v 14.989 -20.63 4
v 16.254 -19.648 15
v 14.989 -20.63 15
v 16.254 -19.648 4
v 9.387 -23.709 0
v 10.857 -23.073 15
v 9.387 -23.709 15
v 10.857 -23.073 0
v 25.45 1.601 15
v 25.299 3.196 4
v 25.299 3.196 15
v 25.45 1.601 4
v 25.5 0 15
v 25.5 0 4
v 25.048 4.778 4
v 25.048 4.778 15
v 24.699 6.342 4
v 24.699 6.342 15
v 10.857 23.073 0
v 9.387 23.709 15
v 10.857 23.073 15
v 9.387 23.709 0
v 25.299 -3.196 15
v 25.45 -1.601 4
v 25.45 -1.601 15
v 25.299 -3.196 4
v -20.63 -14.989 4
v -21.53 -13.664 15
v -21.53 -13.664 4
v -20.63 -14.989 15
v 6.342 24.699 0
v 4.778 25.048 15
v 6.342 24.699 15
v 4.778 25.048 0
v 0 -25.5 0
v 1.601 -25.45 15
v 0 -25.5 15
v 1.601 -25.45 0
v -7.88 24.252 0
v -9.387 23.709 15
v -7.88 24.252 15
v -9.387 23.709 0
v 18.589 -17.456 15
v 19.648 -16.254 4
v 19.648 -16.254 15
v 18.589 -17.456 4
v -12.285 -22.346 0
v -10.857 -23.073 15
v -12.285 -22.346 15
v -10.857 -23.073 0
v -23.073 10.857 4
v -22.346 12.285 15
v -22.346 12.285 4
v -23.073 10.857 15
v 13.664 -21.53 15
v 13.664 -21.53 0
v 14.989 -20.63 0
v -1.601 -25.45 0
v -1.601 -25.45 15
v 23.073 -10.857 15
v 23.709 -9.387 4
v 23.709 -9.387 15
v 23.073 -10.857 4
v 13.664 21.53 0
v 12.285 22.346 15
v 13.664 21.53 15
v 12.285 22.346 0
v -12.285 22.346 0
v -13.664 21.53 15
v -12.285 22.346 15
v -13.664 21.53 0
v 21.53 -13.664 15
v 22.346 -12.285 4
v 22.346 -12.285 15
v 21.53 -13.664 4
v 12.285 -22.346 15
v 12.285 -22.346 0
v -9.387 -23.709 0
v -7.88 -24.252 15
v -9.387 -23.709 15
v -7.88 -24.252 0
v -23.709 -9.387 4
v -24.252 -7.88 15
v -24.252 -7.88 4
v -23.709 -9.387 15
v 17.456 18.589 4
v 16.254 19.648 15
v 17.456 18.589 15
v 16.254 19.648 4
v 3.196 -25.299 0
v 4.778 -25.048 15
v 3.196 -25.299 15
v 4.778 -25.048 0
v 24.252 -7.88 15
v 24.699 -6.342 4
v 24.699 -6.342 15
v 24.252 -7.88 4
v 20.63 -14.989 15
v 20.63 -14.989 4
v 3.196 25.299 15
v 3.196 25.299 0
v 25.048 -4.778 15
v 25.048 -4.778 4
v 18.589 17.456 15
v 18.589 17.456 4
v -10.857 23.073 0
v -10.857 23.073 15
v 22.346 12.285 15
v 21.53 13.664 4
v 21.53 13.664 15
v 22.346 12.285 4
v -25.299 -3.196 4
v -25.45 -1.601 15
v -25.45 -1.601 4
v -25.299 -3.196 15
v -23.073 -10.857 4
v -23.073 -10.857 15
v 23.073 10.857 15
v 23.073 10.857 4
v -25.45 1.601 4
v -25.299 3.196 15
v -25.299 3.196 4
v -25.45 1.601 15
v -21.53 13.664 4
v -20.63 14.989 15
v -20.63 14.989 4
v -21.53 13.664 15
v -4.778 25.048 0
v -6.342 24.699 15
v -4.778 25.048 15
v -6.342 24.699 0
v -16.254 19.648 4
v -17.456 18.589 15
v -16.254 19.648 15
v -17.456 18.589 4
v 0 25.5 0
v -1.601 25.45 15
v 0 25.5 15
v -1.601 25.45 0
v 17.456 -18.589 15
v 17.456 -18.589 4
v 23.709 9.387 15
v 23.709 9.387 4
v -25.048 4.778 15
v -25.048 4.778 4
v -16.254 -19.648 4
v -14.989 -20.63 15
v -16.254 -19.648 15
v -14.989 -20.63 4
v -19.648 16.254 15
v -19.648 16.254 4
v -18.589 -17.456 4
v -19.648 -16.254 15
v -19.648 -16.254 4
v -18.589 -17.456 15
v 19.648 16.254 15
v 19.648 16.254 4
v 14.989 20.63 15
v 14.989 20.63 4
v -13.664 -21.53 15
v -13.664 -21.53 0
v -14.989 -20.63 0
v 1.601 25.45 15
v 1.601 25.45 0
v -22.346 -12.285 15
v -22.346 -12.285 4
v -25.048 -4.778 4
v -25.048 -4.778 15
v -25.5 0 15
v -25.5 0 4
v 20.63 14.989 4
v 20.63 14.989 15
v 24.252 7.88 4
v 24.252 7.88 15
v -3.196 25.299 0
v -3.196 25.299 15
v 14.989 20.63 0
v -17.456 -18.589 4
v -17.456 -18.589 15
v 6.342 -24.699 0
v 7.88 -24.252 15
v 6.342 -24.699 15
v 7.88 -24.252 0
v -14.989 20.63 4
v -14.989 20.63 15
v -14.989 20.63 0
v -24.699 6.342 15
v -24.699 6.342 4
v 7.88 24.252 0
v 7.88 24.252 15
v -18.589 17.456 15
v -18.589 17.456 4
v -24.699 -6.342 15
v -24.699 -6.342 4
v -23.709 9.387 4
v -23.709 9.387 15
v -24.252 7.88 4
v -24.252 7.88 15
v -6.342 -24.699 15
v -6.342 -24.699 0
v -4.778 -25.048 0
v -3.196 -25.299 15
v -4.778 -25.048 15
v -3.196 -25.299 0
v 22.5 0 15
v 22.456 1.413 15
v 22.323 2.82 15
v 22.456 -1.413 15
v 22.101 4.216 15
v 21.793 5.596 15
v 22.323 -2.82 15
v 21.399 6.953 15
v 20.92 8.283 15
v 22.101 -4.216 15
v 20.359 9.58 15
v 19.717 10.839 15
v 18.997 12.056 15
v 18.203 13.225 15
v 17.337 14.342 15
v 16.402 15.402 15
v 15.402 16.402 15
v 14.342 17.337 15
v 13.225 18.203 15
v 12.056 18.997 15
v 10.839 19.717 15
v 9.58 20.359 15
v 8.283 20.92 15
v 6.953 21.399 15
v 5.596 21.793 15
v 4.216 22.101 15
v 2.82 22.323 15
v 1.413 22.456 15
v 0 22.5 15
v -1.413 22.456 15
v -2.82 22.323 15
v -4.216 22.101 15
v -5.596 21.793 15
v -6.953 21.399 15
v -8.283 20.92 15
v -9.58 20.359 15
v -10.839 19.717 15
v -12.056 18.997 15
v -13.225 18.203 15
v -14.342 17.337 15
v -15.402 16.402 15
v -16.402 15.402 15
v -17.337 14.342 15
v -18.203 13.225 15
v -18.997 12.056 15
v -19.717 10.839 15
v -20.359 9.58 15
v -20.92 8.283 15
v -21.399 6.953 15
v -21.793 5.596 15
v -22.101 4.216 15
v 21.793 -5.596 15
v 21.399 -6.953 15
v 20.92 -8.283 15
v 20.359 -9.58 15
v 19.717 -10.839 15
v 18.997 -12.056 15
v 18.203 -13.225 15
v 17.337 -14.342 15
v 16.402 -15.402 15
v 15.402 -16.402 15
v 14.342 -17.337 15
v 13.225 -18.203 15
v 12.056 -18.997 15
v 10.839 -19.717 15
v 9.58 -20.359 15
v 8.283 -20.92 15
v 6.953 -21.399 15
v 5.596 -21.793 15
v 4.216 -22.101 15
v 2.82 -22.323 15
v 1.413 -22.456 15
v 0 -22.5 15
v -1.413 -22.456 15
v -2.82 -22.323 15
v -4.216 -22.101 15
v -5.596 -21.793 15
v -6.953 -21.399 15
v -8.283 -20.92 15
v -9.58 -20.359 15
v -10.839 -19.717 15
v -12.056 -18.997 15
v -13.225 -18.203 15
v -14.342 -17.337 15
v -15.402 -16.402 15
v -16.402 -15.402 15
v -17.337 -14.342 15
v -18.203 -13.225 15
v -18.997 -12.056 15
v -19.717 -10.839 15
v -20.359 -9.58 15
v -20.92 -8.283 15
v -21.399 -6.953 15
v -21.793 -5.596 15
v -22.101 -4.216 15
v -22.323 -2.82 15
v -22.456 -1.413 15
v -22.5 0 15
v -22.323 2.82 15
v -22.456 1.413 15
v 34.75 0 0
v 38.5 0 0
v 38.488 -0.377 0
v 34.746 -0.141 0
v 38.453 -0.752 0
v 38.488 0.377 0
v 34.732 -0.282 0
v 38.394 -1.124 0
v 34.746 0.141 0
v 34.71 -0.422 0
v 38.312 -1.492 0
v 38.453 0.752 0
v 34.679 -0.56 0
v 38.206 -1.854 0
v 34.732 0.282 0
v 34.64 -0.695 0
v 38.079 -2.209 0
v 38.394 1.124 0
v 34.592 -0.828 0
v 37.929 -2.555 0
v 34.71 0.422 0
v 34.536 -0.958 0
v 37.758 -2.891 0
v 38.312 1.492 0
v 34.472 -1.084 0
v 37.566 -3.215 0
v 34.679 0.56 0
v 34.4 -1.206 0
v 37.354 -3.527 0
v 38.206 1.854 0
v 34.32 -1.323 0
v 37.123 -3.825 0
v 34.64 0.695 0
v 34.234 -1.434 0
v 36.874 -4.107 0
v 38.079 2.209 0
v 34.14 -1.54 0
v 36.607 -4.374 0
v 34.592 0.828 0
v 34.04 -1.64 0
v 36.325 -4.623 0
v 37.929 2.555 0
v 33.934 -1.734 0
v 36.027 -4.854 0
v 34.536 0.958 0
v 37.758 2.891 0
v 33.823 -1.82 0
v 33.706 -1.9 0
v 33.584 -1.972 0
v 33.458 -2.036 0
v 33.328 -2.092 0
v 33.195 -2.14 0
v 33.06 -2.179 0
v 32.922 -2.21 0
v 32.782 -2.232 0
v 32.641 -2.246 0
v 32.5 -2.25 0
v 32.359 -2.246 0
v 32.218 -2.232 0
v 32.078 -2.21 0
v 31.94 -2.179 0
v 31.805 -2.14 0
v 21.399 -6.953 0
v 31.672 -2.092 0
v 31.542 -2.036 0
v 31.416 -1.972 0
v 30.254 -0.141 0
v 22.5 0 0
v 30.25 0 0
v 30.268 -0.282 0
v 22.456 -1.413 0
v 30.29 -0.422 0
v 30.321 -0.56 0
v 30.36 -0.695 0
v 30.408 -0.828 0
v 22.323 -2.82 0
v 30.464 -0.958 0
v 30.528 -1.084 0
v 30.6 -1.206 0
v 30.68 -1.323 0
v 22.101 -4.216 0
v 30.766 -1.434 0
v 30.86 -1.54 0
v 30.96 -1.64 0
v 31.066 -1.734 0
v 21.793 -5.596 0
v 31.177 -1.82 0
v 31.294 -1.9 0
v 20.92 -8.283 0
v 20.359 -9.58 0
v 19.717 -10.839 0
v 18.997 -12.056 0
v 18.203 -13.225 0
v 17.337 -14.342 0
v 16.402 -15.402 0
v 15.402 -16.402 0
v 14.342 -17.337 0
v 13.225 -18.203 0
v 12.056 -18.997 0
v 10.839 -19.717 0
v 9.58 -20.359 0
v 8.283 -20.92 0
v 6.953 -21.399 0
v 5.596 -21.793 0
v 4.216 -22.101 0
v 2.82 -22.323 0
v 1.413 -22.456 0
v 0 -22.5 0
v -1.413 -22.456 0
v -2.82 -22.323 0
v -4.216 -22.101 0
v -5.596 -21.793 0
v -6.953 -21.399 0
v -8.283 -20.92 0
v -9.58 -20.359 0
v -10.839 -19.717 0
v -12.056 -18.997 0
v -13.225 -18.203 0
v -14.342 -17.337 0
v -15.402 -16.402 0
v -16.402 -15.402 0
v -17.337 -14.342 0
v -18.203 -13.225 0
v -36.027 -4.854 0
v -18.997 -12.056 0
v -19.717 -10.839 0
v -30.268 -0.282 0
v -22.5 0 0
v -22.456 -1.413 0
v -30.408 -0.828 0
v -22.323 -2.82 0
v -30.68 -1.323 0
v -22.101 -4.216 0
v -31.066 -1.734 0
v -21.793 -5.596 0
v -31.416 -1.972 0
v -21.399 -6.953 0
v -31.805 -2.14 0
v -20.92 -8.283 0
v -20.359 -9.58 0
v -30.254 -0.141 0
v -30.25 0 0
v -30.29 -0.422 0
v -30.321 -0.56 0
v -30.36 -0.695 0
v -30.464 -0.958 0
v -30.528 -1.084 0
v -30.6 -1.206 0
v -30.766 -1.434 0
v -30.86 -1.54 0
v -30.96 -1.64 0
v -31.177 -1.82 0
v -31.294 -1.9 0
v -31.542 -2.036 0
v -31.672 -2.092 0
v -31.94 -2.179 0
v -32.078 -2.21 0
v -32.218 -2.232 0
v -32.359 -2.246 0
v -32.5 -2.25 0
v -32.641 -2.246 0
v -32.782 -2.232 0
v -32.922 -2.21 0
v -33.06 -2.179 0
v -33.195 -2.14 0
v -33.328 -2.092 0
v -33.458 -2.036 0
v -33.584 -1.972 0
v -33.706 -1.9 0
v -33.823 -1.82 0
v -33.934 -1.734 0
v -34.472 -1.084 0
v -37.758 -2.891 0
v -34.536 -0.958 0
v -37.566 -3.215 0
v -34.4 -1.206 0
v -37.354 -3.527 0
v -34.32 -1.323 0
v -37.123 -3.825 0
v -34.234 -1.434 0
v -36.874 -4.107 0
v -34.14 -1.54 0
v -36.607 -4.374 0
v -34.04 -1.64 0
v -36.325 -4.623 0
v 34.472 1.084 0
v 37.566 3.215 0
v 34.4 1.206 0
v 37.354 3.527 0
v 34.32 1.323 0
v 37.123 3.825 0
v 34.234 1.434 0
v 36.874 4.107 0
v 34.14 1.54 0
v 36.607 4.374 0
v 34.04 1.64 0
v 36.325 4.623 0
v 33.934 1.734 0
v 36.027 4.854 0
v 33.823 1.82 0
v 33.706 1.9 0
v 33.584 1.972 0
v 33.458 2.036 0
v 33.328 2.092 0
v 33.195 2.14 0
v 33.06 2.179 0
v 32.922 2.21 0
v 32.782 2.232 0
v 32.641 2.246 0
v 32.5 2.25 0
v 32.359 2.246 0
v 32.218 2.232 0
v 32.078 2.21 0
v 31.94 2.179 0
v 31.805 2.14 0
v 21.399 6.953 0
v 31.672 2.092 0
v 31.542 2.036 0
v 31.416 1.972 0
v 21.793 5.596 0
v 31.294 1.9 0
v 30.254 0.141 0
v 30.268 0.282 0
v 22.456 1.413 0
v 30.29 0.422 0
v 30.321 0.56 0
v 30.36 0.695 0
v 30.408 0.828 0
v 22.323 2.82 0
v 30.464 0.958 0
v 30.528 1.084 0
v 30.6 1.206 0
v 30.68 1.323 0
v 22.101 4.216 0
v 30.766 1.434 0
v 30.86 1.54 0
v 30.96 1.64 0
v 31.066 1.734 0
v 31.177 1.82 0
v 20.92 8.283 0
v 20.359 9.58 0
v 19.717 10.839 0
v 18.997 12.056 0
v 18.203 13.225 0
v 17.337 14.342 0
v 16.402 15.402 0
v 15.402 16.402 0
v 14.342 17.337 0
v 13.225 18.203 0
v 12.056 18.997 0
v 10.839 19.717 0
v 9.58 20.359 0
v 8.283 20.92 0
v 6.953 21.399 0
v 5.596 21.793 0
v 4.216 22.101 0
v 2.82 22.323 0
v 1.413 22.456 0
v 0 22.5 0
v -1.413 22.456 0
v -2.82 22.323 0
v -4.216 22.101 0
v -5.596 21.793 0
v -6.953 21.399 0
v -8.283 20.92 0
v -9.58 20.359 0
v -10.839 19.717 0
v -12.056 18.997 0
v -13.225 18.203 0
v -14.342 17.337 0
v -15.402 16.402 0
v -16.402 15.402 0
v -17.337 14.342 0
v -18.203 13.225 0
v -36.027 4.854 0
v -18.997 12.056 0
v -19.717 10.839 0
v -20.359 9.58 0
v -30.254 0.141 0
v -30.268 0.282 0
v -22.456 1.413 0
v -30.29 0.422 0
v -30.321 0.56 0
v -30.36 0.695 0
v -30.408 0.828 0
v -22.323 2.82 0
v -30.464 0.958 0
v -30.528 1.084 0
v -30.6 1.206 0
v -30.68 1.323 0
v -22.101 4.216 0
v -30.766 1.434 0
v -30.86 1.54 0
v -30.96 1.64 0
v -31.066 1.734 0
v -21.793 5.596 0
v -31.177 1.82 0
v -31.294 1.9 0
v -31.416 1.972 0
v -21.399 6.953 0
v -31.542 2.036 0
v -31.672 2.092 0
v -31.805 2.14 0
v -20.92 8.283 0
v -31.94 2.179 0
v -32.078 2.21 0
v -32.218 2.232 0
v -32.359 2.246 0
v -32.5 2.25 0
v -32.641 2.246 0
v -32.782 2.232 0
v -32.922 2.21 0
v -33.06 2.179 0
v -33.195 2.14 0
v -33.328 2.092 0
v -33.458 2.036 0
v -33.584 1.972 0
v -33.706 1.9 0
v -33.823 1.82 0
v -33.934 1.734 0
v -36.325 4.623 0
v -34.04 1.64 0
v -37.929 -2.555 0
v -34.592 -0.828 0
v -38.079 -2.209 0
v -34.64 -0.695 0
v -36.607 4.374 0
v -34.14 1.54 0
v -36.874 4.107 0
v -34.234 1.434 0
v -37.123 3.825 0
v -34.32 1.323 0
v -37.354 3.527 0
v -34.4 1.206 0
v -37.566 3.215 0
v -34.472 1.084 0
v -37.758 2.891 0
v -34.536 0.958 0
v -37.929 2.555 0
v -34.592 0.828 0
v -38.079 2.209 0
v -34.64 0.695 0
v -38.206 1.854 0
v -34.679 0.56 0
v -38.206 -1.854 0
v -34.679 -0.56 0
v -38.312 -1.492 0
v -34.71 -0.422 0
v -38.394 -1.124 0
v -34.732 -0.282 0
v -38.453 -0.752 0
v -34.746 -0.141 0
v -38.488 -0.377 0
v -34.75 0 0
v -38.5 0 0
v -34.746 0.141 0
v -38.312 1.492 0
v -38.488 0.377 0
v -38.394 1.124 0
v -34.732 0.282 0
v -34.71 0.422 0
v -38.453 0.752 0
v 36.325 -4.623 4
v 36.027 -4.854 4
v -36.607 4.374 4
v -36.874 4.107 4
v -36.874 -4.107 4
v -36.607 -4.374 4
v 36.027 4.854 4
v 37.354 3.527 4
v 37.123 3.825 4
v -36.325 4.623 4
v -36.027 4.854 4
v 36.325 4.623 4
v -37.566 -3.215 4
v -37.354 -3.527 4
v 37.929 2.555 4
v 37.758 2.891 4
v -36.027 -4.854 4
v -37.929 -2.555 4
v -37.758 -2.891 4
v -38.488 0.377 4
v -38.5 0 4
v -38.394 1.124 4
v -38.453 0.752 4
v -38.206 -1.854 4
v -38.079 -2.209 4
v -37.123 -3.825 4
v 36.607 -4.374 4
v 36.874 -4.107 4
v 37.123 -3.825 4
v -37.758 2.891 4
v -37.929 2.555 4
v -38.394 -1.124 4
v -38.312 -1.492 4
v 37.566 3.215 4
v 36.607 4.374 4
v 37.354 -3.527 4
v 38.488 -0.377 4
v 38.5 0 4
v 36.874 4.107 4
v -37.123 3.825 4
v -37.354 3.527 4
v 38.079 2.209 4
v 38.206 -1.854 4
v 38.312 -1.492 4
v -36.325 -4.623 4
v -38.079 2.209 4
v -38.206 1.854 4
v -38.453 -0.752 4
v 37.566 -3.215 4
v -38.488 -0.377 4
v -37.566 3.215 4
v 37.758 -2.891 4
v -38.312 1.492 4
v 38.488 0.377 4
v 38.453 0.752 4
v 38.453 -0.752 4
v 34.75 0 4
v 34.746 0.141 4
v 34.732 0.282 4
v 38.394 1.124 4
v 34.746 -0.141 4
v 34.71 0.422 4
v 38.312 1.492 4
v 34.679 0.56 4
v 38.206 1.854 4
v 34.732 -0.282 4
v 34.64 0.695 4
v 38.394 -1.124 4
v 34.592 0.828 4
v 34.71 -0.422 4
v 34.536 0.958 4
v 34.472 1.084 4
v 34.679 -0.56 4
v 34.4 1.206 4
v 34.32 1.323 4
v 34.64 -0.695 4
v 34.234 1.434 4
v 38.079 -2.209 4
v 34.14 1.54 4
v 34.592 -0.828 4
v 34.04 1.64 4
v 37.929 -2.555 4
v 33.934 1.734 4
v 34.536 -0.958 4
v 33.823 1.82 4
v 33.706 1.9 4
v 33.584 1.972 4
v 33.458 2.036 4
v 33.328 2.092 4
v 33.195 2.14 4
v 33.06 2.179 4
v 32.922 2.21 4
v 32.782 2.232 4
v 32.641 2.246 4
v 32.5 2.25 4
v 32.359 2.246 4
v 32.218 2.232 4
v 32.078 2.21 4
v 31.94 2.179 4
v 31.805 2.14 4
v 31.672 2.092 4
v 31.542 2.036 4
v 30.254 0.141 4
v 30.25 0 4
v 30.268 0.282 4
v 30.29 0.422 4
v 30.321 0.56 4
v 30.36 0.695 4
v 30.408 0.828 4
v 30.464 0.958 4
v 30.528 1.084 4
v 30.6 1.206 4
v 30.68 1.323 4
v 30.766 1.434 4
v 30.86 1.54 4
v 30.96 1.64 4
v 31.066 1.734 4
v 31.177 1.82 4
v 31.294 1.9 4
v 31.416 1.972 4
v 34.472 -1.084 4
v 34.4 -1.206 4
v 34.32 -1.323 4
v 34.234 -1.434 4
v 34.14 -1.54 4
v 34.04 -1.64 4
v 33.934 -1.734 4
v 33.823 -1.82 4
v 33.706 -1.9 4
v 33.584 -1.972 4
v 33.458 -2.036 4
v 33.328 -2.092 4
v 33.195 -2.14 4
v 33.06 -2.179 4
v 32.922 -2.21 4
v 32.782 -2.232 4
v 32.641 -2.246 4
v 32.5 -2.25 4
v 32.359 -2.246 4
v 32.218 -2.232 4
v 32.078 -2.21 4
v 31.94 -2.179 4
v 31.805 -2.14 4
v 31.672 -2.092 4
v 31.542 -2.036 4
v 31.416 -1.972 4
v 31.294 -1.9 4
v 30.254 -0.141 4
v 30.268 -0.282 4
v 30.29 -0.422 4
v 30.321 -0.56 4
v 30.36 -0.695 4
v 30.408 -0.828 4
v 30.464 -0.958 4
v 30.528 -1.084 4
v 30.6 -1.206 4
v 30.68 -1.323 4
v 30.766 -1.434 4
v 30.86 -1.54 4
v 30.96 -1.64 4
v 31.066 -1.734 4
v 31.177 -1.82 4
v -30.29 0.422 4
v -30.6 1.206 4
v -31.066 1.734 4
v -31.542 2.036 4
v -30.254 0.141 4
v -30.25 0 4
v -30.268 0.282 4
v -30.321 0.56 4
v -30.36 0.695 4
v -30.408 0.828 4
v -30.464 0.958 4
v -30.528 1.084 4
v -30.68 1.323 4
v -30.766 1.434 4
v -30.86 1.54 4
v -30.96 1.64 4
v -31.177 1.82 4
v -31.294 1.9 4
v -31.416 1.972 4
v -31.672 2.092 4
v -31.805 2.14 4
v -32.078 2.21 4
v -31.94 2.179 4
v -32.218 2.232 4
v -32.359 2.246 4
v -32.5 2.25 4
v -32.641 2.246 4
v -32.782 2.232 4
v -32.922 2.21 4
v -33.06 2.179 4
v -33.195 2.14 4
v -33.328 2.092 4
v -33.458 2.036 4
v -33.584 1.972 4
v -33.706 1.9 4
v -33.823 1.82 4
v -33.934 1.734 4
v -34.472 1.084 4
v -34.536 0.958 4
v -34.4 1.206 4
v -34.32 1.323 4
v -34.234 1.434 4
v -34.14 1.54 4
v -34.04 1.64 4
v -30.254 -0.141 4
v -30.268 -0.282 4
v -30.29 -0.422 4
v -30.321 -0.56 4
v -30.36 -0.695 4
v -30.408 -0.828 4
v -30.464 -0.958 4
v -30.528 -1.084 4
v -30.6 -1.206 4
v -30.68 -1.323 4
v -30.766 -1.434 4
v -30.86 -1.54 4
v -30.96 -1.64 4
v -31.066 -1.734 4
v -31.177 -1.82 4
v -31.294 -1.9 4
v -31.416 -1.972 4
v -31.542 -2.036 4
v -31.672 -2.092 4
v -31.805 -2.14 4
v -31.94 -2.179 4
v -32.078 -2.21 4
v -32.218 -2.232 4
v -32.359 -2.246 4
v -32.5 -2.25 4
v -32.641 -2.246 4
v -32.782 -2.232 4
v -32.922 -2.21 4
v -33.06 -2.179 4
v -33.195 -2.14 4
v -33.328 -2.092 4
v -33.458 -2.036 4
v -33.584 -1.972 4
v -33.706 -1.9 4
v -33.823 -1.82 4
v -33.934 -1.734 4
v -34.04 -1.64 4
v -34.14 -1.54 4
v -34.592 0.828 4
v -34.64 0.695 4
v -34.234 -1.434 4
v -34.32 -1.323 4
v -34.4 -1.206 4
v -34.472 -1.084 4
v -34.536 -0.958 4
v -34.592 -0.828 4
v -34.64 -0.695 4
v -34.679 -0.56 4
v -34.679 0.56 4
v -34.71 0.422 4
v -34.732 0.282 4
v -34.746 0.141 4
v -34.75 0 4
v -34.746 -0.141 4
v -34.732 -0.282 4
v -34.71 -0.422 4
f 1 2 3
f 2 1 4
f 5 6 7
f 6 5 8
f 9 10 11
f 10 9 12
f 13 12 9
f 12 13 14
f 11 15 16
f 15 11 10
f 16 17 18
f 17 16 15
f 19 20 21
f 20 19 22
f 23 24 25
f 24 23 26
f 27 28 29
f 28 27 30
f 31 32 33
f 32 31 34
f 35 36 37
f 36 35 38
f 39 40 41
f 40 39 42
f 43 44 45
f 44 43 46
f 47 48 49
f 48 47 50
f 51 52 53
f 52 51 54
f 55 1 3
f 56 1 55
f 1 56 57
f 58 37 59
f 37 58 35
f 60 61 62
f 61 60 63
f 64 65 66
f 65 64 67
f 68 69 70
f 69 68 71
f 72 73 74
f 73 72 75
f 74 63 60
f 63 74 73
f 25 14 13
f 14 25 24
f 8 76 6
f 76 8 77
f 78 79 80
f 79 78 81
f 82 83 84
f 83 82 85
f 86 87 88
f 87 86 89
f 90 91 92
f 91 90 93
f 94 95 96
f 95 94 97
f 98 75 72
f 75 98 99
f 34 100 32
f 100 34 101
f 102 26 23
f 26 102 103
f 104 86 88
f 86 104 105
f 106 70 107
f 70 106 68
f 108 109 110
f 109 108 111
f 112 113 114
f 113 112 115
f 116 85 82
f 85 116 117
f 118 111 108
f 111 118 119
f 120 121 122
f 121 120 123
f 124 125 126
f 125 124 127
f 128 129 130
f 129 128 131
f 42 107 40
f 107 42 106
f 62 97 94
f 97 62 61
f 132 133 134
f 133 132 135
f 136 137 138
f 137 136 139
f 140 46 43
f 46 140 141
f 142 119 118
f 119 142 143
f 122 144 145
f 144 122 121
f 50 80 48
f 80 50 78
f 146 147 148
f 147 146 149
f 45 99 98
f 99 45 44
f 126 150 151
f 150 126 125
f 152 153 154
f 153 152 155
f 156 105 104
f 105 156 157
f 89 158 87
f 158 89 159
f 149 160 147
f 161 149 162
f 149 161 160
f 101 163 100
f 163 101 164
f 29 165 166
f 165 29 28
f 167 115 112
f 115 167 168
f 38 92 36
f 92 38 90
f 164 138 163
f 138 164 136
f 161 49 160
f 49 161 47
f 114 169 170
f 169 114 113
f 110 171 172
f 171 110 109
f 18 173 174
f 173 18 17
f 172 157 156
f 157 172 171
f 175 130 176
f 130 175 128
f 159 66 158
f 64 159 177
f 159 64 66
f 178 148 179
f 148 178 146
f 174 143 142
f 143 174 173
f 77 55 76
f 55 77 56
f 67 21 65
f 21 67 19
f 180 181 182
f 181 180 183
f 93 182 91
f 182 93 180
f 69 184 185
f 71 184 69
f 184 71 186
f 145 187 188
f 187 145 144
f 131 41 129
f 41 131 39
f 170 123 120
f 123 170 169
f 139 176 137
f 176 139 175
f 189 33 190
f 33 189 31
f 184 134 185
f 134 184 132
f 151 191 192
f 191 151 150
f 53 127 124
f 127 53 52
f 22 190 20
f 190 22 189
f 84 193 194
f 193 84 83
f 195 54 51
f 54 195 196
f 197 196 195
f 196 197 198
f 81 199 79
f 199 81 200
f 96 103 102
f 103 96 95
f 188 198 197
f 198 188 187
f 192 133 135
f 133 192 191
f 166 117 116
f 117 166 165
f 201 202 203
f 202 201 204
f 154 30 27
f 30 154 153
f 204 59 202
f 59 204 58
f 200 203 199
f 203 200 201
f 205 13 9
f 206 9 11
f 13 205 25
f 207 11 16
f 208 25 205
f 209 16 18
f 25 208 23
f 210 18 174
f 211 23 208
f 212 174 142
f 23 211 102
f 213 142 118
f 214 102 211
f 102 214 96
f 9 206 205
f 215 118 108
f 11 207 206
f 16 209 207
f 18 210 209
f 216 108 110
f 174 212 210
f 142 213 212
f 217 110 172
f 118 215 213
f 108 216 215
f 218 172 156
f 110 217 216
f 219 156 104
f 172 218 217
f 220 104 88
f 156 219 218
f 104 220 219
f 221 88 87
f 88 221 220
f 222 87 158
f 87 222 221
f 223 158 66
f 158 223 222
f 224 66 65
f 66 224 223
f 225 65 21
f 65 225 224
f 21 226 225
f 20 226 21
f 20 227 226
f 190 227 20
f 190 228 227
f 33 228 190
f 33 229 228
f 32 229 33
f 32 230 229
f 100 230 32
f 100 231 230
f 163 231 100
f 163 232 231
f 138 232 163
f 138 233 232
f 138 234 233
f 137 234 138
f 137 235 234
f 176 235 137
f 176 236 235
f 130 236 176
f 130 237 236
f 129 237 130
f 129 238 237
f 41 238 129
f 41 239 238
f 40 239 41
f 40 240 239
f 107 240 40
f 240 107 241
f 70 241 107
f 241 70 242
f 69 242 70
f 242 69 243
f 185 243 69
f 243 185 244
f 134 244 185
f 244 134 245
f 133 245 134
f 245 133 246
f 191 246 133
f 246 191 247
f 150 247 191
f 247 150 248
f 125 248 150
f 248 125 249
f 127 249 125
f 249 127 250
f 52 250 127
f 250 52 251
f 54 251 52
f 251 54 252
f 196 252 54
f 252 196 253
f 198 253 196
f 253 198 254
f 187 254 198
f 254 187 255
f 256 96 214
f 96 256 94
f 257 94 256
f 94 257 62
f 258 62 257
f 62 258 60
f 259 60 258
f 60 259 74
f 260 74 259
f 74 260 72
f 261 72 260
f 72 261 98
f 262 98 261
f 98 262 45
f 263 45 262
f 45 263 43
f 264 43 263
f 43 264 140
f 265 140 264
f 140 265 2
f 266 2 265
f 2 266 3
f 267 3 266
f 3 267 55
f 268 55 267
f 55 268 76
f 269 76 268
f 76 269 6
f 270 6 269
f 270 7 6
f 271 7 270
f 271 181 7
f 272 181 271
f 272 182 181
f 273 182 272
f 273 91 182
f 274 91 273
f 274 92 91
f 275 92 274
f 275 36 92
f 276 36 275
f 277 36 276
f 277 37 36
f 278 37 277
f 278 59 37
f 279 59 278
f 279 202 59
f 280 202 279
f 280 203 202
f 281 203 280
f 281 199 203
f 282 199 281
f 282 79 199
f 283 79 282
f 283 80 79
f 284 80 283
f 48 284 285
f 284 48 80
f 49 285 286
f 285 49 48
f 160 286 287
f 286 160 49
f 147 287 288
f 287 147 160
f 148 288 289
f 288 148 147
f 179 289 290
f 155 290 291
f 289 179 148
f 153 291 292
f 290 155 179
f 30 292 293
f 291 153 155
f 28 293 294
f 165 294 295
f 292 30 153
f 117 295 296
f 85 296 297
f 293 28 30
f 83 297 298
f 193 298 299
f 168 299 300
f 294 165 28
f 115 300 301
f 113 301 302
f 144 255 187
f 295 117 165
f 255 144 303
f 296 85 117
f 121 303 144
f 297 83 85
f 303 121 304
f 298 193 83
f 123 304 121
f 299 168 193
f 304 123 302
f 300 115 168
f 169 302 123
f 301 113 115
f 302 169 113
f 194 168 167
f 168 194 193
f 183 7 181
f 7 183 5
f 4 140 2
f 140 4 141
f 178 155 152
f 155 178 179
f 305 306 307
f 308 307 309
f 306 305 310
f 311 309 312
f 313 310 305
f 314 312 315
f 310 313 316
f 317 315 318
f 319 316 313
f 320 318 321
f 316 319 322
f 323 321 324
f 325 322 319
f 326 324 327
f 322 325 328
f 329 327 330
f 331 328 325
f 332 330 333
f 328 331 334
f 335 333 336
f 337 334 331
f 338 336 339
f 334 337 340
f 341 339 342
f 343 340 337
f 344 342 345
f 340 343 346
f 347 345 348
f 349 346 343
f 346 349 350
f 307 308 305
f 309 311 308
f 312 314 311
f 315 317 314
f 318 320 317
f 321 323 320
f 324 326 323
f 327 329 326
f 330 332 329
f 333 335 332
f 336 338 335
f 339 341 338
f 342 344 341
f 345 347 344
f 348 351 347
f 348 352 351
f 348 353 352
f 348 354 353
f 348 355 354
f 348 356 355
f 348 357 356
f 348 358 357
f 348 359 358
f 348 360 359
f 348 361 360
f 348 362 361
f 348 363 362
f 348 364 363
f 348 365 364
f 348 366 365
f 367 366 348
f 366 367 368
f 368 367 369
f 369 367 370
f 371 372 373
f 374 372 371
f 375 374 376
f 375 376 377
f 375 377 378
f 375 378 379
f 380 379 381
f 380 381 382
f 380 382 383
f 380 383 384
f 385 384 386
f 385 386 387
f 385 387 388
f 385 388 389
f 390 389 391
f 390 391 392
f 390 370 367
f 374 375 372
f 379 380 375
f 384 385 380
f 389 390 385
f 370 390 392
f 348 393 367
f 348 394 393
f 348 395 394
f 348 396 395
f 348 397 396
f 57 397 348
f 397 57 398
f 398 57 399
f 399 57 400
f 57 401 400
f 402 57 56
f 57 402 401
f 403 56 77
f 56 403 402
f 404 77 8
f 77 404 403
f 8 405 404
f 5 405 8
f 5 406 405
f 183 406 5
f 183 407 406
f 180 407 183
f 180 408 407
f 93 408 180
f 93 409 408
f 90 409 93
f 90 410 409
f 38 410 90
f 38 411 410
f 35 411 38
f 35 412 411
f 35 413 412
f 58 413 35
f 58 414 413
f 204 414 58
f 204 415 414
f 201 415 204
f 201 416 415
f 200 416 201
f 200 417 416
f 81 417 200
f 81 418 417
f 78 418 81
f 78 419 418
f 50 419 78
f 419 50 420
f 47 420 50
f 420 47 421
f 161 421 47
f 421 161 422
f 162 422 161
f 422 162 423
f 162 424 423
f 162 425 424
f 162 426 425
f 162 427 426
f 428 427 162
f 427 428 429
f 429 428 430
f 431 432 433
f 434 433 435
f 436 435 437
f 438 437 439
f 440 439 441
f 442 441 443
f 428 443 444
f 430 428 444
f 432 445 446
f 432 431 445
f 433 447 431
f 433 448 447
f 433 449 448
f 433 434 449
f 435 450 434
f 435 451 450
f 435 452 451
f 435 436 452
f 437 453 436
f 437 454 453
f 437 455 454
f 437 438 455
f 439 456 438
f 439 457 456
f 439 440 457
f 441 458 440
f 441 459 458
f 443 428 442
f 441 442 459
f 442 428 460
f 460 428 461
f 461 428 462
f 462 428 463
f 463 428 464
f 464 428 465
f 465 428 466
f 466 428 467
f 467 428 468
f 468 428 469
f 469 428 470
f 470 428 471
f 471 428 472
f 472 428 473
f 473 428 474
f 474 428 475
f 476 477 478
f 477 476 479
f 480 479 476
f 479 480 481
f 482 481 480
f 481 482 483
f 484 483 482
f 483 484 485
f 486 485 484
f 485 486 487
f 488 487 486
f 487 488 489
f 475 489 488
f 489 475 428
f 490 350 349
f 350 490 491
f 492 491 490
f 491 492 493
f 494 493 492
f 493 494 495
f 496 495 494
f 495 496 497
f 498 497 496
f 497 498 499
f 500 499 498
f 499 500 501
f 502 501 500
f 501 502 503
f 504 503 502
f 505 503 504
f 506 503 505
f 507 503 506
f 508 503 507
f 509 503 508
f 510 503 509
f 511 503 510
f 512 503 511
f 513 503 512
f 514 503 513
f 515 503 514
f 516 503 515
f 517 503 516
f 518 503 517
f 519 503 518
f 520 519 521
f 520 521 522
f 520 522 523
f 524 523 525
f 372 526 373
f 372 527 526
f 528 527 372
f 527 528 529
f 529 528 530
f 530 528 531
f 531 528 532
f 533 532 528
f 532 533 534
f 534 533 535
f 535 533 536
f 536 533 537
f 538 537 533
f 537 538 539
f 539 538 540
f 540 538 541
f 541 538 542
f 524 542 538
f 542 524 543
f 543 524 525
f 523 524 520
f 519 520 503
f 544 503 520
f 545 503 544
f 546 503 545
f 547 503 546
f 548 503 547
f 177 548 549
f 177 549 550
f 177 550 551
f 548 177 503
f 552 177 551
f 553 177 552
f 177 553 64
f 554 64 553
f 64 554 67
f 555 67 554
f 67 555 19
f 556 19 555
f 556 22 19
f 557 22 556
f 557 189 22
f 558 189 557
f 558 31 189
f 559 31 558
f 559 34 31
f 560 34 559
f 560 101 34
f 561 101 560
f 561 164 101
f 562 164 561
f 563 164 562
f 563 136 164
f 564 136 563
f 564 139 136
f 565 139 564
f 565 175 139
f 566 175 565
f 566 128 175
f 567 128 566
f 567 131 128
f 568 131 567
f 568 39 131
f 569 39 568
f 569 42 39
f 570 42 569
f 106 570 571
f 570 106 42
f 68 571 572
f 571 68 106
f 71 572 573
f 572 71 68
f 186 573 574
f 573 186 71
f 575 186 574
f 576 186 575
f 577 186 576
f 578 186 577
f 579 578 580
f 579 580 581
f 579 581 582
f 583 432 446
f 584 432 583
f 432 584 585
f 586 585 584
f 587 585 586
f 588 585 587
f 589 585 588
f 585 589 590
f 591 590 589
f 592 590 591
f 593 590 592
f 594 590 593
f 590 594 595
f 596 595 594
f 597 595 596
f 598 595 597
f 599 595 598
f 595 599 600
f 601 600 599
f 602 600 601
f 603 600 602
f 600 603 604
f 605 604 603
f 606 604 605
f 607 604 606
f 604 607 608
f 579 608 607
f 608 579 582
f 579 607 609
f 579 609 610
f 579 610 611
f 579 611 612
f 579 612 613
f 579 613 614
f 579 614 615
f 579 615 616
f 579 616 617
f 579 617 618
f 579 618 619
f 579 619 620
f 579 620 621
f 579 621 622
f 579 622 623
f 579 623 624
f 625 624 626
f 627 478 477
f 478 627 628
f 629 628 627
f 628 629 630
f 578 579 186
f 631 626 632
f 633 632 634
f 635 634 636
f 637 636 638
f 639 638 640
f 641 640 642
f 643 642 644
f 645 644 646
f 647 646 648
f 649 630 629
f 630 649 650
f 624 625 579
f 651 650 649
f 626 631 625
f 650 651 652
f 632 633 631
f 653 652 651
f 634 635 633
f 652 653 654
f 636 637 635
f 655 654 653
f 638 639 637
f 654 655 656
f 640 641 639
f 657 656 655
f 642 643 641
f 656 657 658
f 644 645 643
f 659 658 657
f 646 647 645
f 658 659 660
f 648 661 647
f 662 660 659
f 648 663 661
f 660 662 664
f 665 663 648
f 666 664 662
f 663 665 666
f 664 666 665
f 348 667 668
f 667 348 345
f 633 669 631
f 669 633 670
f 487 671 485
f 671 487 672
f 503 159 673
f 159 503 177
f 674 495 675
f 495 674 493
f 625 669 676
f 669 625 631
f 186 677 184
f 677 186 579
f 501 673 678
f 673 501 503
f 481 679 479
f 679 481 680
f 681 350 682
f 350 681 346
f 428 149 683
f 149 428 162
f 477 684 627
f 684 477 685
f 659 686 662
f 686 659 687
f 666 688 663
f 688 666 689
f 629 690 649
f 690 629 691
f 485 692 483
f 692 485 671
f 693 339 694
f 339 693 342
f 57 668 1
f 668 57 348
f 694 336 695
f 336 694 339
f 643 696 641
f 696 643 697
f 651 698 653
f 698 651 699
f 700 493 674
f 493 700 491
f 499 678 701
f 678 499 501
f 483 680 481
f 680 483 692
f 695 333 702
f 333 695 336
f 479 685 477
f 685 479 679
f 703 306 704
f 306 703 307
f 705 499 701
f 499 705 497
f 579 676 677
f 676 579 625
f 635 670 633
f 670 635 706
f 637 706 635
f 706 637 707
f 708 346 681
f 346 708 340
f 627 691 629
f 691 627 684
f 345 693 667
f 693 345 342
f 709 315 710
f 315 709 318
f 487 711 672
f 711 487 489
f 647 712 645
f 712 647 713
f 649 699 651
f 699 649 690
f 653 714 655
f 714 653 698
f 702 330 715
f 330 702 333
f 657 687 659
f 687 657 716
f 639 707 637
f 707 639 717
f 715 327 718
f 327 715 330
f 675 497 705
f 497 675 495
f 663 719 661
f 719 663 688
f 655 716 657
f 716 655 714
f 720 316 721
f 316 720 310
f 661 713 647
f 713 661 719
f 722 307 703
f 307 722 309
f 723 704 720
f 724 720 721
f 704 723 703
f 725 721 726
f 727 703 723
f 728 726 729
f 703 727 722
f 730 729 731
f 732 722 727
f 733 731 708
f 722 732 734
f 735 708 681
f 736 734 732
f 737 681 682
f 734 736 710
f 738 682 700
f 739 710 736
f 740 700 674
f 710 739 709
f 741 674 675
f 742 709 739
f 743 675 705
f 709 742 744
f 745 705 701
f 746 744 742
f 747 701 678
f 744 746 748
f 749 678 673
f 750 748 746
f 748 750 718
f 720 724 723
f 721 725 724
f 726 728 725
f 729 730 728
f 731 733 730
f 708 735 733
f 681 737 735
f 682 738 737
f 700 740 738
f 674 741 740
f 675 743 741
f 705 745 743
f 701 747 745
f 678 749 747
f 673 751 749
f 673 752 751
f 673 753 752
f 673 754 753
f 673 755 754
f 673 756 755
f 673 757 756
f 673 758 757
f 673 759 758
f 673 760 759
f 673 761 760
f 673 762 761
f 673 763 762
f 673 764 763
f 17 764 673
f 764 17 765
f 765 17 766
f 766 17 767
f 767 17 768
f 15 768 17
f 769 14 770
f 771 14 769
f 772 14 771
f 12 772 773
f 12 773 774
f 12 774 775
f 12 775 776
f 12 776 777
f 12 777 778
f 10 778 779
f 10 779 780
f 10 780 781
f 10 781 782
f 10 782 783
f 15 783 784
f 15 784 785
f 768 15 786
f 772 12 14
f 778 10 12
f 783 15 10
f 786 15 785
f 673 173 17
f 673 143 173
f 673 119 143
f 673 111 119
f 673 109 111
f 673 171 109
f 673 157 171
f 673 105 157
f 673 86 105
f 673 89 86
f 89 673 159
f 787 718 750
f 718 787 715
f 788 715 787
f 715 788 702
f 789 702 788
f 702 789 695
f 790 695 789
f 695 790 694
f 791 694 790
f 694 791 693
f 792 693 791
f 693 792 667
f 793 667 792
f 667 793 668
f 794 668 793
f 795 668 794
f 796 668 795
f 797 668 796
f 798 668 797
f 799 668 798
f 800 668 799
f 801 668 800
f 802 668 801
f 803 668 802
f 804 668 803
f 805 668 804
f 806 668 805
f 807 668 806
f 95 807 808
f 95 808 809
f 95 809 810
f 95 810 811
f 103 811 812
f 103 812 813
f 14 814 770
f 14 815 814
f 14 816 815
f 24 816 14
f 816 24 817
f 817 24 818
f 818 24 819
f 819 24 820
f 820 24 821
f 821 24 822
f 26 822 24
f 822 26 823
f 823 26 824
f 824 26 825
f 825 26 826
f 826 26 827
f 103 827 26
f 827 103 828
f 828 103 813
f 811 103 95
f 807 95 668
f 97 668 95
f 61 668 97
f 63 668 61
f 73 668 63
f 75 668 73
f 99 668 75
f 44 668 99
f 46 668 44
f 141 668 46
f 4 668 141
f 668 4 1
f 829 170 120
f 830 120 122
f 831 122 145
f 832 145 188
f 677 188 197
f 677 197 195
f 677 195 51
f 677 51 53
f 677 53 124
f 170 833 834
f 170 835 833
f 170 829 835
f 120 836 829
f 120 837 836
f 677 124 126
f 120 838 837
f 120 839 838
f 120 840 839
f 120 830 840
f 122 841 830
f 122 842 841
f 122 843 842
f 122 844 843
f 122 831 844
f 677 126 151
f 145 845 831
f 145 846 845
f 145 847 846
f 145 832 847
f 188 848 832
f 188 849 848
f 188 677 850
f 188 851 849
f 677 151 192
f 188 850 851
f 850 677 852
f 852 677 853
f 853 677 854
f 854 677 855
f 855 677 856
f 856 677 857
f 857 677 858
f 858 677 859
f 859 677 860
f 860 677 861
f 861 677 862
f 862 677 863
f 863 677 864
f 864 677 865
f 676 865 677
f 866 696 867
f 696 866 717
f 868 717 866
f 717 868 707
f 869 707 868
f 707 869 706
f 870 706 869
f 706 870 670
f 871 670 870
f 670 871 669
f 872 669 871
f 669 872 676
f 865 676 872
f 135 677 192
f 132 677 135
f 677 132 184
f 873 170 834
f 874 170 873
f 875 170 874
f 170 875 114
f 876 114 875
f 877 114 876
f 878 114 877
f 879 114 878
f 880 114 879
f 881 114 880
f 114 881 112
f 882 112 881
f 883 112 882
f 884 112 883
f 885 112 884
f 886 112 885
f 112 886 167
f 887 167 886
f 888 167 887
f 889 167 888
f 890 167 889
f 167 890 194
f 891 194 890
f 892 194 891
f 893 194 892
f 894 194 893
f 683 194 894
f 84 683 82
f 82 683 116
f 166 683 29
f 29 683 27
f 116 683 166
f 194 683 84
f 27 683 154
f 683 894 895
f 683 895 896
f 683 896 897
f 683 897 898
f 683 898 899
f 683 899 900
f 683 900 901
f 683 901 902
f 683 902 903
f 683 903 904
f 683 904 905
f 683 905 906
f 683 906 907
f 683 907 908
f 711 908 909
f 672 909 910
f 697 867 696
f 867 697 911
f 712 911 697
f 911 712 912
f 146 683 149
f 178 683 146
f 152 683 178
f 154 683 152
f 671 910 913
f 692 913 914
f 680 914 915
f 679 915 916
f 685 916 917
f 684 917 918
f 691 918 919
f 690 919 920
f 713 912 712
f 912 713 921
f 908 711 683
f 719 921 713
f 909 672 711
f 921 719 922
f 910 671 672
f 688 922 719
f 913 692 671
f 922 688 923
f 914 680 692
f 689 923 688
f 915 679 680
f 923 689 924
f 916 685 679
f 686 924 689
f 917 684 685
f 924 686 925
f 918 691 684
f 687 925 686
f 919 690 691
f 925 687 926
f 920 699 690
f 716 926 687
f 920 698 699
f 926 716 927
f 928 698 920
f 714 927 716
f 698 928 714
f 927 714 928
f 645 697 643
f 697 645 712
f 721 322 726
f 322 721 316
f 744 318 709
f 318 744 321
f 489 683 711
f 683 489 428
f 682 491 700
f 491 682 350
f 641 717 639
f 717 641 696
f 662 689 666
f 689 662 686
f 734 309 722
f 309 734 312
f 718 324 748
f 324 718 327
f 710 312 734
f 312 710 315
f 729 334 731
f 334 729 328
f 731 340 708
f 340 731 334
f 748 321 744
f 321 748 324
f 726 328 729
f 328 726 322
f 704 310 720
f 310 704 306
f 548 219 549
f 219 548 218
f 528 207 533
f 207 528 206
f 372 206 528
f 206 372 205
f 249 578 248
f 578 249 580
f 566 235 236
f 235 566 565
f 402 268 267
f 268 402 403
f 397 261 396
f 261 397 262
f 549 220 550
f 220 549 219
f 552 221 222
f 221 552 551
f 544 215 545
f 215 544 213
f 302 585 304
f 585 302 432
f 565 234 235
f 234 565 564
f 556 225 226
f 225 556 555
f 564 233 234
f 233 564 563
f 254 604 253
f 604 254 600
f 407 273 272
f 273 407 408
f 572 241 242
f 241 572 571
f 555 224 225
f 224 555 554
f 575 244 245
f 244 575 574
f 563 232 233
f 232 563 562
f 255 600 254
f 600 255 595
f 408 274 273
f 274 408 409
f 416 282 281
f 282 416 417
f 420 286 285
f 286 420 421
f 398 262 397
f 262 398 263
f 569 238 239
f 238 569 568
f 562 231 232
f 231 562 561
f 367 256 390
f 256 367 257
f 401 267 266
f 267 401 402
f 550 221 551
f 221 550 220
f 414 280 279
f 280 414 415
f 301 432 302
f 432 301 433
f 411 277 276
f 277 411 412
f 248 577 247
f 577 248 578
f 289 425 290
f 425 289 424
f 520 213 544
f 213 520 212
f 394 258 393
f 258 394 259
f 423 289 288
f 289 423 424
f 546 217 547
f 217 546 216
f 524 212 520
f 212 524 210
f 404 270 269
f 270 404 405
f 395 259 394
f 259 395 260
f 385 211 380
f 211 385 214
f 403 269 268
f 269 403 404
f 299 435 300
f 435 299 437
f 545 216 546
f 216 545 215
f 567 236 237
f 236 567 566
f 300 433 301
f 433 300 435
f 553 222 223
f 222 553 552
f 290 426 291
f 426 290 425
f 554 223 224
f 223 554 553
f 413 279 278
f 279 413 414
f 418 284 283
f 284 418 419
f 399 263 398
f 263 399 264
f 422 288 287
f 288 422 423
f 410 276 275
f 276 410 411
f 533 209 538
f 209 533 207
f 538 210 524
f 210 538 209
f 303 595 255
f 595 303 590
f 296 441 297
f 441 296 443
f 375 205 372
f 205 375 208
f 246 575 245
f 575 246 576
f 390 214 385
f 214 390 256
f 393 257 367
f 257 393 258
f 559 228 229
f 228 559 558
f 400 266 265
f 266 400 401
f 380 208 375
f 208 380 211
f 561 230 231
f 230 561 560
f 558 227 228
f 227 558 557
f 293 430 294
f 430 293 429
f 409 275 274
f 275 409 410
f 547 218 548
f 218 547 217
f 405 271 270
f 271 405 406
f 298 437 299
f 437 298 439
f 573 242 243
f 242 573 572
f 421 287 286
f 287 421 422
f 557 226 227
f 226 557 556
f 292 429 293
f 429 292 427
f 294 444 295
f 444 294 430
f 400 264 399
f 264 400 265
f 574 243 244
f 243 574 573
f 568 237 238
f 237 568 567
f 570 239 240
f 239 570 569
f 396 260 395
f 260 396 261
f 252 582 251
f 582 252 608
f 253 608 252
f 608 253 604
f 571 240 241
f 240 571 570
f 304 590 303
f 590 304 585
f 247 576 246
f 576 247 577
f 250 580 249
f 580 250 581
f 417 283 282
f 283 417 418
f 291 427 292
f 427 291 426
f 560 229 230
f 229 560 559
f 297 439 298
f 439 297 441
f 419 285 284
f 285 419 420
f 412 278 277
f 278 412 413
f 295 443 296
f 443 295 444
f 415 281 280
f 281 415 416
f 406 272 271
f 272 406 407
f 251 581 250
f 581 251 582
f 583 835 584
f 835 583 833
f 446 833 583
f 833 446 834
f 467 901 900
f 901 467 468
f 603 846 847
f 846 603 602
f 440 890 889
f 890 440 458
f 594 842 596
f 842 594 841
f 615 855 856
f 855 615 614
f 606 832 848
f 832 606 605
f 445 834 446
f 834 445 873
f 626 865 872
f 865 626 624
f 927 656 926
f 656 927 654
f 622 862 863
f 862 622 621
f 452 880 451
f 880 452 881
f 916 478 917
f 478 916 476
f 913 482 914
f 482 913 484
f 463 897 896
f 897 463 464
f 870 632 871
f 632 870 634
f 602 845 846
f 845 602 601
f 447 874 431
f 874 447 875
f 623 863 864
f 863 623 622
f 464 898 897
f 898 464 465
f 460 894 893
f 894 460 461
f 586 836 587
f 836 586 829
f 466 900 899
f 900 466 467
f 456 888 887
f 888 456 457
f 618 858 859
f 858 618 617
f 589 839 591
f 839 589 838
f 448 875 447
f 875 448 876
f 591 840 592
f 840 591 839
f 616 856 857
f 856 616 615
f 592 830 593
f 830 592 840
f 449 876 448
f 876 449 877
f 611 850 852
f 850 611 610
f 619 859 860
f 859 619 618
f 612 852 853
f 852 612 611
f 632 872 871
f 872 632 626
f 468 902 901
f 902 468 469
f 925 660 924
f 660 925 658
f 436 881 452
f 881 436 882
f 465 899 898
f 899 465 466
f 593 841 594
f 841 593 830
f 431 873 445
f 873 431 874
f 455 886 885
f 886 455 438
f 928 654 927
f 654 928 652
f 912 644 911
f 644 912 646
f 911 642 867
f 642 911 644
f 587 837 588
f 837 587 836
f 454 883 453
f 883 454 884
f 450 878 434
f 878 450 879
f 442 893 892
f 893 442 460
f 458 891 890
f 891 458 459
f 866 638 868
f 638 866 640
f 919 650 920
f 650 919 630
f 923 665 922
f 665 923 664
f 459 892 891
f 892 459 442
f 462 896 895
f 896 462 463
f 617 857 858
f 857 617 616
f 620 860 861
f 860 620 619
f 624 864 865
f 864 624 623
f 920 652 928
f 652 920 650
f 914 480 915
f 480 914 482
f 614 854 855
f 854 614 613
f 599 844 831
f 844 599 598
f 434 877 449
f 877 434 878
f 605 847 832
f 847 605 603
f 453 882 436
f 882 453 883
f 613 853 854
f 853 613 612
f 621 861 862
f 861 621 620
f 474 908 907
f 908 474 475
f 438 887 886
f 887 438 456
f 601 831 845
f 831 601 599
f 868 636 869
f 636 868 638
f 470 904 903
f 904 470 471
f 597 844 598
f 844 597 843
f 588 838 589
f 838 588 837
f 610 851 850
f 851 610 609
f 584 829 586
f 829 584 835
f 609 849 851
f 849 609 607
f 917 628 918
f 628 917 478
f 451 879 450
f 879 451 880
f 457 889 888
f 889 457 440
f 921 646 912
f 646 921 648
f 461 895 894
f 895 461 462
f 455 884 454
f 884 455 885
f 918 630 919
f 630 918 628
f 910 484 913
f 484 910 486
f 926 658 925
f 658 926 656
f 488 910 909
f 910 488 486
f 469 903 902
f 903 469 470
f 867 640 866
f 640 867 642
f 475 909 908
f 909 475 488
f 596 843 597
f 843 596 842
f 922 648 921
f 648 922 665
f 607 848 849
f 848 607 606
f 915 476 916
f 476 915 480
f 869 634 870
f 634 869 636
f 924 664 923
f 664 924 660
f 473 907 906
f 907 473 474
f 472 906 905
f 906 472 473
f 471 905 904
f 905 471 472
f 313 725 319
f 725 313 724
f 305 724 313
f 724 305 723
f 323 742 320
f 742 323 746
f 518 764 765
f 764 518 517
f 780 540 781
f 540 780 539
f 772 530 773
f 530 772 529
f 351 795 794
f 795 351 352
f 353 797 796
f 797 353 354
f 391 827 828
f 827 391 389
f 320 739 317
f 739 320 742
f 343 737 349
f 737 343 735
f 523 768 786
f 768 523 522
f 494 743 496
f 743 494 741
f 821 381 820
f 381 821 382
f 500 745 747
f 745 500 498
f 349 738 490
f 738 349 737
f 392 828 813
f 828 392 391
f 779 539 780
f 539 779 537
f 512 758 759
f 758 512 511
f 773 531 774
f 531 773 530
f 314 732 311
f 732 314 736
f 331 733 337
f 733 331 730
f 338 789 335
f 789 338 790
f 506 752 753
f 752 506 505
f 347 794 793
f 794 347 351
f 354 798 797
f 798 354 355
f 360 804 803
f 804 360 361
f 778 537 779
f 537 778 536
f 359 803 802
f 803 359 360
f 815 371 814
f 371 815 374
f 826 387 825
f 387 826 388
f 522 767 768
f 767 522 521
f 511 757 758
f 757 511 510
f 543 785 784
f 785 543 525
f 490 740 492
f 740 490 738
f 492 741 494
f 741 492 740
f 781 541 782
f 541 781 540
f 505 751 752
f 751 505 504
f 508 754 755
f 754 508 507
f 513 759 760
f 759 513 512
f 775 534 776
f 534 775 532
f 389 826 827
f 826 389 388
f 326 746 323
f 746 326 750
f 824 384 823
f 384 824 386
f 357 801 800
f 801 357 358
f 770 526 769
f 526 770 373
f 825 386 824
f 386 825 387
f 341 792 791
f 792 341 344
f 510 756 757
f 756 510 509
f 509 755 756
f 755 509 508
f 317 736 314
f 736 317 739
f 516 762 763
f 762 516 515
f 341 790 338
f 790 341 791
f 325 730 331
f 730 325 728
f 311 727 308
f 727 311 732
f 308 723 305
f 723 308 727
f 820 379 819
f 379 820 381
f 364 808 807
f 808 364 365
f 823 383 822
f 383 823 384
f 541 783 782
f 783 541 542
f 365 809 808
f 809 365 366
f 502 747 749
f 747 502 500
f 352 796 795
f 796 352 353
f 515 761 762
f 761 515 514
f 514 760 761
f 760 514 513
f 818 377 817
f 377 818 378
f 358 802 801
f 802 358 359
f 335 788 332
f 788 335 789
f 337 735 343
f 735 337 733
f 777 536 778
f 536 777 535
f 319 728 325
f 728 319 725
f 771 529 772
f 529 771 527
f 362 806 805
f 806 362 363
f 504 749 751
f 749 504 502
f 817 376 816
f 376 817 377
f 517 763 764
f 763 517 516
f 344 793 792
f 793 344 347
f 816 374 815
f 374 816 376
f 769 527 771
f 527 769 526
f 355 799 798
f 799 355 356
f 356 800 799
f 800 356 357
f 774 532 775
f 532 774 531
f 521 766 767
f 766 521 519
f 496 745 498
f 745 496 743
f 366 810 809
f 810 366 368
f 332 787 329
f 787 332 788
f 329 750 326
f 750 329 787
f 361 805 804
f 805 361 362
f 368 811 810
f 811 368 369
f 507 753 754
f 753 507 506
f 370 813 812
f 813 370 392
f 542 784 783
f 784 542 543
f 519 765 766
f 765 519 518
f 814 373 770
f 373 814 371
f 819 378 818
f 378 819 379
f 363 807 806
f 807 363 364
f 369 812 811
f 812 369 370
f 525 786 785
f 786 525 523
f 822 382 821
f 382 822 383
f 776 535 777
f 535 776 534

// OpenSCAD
// 2015-2025 Ford F-150 A-Pillar Tweeter Adapter
// Parametric configuration

/* [Dimensions] */
// Inner diameter to fit the aftermarket tweeter housing
tweeter_id = 45.0;

// Depth of the ring holding the tweeter
tweeter_depth = 15.0;

// Distance between the factory A-pillar mounting posts
mount_spread = 65.0;

// Diameter of the factory screws
mount_hole_dia = 4.5;

// Wall thickness
wall_thickness = 3.0;

// Thickness of the mounting tabs
tab_thickness = 4.0;

/* [Hidden] */
$fn = 100;

module tweeter_bracket() {
    outer_dia = tweeter_id + (2 * wall_thickness);

    difference() {
        // --- ADDITIVE GEOMETRY ---
        union() {
            // 1. The main housing ring
            cylinder(h=tweeter_depth, d=outer_dia);

            // 2. The mounting ears (hulled from the center)
            hull() {
                cylinder(h=tab_thickness, d=outer_dia);

                // Left mounting ear
                translate([-mount_spread/2, 0, 0])
                    cylinder(h=tab_thickness, d=12.0);

                // Right mounting ear
                translate([mount_spread/2, 0, 0])
                    cylinder(h=tab_thickness, d=12.0);
            }
        }

        // --- SUBTRACTIVE GEOMETRY ---
        union() {
            // 3. Center cutout for the tweeter body
            translate([0, 0, -1])
                cylinder(h=tweeter_depth + 2, d=tweeter_id);

            // 4. Left mounting hole
            translate([-mount_spread/2, 0, -1])
                cylinder(h=tab_thickness + 2, d=mount_hole_dia);

            // 5. Right mounting hole
            translate([mount_spread/2, 0, -1])
                cylinder(h=tab_thickness + 2, d=mount_hole_dia);
        }
    }
}

// Generate the part (Printed flat on its mounting tabs)
tweeter_bracket();
